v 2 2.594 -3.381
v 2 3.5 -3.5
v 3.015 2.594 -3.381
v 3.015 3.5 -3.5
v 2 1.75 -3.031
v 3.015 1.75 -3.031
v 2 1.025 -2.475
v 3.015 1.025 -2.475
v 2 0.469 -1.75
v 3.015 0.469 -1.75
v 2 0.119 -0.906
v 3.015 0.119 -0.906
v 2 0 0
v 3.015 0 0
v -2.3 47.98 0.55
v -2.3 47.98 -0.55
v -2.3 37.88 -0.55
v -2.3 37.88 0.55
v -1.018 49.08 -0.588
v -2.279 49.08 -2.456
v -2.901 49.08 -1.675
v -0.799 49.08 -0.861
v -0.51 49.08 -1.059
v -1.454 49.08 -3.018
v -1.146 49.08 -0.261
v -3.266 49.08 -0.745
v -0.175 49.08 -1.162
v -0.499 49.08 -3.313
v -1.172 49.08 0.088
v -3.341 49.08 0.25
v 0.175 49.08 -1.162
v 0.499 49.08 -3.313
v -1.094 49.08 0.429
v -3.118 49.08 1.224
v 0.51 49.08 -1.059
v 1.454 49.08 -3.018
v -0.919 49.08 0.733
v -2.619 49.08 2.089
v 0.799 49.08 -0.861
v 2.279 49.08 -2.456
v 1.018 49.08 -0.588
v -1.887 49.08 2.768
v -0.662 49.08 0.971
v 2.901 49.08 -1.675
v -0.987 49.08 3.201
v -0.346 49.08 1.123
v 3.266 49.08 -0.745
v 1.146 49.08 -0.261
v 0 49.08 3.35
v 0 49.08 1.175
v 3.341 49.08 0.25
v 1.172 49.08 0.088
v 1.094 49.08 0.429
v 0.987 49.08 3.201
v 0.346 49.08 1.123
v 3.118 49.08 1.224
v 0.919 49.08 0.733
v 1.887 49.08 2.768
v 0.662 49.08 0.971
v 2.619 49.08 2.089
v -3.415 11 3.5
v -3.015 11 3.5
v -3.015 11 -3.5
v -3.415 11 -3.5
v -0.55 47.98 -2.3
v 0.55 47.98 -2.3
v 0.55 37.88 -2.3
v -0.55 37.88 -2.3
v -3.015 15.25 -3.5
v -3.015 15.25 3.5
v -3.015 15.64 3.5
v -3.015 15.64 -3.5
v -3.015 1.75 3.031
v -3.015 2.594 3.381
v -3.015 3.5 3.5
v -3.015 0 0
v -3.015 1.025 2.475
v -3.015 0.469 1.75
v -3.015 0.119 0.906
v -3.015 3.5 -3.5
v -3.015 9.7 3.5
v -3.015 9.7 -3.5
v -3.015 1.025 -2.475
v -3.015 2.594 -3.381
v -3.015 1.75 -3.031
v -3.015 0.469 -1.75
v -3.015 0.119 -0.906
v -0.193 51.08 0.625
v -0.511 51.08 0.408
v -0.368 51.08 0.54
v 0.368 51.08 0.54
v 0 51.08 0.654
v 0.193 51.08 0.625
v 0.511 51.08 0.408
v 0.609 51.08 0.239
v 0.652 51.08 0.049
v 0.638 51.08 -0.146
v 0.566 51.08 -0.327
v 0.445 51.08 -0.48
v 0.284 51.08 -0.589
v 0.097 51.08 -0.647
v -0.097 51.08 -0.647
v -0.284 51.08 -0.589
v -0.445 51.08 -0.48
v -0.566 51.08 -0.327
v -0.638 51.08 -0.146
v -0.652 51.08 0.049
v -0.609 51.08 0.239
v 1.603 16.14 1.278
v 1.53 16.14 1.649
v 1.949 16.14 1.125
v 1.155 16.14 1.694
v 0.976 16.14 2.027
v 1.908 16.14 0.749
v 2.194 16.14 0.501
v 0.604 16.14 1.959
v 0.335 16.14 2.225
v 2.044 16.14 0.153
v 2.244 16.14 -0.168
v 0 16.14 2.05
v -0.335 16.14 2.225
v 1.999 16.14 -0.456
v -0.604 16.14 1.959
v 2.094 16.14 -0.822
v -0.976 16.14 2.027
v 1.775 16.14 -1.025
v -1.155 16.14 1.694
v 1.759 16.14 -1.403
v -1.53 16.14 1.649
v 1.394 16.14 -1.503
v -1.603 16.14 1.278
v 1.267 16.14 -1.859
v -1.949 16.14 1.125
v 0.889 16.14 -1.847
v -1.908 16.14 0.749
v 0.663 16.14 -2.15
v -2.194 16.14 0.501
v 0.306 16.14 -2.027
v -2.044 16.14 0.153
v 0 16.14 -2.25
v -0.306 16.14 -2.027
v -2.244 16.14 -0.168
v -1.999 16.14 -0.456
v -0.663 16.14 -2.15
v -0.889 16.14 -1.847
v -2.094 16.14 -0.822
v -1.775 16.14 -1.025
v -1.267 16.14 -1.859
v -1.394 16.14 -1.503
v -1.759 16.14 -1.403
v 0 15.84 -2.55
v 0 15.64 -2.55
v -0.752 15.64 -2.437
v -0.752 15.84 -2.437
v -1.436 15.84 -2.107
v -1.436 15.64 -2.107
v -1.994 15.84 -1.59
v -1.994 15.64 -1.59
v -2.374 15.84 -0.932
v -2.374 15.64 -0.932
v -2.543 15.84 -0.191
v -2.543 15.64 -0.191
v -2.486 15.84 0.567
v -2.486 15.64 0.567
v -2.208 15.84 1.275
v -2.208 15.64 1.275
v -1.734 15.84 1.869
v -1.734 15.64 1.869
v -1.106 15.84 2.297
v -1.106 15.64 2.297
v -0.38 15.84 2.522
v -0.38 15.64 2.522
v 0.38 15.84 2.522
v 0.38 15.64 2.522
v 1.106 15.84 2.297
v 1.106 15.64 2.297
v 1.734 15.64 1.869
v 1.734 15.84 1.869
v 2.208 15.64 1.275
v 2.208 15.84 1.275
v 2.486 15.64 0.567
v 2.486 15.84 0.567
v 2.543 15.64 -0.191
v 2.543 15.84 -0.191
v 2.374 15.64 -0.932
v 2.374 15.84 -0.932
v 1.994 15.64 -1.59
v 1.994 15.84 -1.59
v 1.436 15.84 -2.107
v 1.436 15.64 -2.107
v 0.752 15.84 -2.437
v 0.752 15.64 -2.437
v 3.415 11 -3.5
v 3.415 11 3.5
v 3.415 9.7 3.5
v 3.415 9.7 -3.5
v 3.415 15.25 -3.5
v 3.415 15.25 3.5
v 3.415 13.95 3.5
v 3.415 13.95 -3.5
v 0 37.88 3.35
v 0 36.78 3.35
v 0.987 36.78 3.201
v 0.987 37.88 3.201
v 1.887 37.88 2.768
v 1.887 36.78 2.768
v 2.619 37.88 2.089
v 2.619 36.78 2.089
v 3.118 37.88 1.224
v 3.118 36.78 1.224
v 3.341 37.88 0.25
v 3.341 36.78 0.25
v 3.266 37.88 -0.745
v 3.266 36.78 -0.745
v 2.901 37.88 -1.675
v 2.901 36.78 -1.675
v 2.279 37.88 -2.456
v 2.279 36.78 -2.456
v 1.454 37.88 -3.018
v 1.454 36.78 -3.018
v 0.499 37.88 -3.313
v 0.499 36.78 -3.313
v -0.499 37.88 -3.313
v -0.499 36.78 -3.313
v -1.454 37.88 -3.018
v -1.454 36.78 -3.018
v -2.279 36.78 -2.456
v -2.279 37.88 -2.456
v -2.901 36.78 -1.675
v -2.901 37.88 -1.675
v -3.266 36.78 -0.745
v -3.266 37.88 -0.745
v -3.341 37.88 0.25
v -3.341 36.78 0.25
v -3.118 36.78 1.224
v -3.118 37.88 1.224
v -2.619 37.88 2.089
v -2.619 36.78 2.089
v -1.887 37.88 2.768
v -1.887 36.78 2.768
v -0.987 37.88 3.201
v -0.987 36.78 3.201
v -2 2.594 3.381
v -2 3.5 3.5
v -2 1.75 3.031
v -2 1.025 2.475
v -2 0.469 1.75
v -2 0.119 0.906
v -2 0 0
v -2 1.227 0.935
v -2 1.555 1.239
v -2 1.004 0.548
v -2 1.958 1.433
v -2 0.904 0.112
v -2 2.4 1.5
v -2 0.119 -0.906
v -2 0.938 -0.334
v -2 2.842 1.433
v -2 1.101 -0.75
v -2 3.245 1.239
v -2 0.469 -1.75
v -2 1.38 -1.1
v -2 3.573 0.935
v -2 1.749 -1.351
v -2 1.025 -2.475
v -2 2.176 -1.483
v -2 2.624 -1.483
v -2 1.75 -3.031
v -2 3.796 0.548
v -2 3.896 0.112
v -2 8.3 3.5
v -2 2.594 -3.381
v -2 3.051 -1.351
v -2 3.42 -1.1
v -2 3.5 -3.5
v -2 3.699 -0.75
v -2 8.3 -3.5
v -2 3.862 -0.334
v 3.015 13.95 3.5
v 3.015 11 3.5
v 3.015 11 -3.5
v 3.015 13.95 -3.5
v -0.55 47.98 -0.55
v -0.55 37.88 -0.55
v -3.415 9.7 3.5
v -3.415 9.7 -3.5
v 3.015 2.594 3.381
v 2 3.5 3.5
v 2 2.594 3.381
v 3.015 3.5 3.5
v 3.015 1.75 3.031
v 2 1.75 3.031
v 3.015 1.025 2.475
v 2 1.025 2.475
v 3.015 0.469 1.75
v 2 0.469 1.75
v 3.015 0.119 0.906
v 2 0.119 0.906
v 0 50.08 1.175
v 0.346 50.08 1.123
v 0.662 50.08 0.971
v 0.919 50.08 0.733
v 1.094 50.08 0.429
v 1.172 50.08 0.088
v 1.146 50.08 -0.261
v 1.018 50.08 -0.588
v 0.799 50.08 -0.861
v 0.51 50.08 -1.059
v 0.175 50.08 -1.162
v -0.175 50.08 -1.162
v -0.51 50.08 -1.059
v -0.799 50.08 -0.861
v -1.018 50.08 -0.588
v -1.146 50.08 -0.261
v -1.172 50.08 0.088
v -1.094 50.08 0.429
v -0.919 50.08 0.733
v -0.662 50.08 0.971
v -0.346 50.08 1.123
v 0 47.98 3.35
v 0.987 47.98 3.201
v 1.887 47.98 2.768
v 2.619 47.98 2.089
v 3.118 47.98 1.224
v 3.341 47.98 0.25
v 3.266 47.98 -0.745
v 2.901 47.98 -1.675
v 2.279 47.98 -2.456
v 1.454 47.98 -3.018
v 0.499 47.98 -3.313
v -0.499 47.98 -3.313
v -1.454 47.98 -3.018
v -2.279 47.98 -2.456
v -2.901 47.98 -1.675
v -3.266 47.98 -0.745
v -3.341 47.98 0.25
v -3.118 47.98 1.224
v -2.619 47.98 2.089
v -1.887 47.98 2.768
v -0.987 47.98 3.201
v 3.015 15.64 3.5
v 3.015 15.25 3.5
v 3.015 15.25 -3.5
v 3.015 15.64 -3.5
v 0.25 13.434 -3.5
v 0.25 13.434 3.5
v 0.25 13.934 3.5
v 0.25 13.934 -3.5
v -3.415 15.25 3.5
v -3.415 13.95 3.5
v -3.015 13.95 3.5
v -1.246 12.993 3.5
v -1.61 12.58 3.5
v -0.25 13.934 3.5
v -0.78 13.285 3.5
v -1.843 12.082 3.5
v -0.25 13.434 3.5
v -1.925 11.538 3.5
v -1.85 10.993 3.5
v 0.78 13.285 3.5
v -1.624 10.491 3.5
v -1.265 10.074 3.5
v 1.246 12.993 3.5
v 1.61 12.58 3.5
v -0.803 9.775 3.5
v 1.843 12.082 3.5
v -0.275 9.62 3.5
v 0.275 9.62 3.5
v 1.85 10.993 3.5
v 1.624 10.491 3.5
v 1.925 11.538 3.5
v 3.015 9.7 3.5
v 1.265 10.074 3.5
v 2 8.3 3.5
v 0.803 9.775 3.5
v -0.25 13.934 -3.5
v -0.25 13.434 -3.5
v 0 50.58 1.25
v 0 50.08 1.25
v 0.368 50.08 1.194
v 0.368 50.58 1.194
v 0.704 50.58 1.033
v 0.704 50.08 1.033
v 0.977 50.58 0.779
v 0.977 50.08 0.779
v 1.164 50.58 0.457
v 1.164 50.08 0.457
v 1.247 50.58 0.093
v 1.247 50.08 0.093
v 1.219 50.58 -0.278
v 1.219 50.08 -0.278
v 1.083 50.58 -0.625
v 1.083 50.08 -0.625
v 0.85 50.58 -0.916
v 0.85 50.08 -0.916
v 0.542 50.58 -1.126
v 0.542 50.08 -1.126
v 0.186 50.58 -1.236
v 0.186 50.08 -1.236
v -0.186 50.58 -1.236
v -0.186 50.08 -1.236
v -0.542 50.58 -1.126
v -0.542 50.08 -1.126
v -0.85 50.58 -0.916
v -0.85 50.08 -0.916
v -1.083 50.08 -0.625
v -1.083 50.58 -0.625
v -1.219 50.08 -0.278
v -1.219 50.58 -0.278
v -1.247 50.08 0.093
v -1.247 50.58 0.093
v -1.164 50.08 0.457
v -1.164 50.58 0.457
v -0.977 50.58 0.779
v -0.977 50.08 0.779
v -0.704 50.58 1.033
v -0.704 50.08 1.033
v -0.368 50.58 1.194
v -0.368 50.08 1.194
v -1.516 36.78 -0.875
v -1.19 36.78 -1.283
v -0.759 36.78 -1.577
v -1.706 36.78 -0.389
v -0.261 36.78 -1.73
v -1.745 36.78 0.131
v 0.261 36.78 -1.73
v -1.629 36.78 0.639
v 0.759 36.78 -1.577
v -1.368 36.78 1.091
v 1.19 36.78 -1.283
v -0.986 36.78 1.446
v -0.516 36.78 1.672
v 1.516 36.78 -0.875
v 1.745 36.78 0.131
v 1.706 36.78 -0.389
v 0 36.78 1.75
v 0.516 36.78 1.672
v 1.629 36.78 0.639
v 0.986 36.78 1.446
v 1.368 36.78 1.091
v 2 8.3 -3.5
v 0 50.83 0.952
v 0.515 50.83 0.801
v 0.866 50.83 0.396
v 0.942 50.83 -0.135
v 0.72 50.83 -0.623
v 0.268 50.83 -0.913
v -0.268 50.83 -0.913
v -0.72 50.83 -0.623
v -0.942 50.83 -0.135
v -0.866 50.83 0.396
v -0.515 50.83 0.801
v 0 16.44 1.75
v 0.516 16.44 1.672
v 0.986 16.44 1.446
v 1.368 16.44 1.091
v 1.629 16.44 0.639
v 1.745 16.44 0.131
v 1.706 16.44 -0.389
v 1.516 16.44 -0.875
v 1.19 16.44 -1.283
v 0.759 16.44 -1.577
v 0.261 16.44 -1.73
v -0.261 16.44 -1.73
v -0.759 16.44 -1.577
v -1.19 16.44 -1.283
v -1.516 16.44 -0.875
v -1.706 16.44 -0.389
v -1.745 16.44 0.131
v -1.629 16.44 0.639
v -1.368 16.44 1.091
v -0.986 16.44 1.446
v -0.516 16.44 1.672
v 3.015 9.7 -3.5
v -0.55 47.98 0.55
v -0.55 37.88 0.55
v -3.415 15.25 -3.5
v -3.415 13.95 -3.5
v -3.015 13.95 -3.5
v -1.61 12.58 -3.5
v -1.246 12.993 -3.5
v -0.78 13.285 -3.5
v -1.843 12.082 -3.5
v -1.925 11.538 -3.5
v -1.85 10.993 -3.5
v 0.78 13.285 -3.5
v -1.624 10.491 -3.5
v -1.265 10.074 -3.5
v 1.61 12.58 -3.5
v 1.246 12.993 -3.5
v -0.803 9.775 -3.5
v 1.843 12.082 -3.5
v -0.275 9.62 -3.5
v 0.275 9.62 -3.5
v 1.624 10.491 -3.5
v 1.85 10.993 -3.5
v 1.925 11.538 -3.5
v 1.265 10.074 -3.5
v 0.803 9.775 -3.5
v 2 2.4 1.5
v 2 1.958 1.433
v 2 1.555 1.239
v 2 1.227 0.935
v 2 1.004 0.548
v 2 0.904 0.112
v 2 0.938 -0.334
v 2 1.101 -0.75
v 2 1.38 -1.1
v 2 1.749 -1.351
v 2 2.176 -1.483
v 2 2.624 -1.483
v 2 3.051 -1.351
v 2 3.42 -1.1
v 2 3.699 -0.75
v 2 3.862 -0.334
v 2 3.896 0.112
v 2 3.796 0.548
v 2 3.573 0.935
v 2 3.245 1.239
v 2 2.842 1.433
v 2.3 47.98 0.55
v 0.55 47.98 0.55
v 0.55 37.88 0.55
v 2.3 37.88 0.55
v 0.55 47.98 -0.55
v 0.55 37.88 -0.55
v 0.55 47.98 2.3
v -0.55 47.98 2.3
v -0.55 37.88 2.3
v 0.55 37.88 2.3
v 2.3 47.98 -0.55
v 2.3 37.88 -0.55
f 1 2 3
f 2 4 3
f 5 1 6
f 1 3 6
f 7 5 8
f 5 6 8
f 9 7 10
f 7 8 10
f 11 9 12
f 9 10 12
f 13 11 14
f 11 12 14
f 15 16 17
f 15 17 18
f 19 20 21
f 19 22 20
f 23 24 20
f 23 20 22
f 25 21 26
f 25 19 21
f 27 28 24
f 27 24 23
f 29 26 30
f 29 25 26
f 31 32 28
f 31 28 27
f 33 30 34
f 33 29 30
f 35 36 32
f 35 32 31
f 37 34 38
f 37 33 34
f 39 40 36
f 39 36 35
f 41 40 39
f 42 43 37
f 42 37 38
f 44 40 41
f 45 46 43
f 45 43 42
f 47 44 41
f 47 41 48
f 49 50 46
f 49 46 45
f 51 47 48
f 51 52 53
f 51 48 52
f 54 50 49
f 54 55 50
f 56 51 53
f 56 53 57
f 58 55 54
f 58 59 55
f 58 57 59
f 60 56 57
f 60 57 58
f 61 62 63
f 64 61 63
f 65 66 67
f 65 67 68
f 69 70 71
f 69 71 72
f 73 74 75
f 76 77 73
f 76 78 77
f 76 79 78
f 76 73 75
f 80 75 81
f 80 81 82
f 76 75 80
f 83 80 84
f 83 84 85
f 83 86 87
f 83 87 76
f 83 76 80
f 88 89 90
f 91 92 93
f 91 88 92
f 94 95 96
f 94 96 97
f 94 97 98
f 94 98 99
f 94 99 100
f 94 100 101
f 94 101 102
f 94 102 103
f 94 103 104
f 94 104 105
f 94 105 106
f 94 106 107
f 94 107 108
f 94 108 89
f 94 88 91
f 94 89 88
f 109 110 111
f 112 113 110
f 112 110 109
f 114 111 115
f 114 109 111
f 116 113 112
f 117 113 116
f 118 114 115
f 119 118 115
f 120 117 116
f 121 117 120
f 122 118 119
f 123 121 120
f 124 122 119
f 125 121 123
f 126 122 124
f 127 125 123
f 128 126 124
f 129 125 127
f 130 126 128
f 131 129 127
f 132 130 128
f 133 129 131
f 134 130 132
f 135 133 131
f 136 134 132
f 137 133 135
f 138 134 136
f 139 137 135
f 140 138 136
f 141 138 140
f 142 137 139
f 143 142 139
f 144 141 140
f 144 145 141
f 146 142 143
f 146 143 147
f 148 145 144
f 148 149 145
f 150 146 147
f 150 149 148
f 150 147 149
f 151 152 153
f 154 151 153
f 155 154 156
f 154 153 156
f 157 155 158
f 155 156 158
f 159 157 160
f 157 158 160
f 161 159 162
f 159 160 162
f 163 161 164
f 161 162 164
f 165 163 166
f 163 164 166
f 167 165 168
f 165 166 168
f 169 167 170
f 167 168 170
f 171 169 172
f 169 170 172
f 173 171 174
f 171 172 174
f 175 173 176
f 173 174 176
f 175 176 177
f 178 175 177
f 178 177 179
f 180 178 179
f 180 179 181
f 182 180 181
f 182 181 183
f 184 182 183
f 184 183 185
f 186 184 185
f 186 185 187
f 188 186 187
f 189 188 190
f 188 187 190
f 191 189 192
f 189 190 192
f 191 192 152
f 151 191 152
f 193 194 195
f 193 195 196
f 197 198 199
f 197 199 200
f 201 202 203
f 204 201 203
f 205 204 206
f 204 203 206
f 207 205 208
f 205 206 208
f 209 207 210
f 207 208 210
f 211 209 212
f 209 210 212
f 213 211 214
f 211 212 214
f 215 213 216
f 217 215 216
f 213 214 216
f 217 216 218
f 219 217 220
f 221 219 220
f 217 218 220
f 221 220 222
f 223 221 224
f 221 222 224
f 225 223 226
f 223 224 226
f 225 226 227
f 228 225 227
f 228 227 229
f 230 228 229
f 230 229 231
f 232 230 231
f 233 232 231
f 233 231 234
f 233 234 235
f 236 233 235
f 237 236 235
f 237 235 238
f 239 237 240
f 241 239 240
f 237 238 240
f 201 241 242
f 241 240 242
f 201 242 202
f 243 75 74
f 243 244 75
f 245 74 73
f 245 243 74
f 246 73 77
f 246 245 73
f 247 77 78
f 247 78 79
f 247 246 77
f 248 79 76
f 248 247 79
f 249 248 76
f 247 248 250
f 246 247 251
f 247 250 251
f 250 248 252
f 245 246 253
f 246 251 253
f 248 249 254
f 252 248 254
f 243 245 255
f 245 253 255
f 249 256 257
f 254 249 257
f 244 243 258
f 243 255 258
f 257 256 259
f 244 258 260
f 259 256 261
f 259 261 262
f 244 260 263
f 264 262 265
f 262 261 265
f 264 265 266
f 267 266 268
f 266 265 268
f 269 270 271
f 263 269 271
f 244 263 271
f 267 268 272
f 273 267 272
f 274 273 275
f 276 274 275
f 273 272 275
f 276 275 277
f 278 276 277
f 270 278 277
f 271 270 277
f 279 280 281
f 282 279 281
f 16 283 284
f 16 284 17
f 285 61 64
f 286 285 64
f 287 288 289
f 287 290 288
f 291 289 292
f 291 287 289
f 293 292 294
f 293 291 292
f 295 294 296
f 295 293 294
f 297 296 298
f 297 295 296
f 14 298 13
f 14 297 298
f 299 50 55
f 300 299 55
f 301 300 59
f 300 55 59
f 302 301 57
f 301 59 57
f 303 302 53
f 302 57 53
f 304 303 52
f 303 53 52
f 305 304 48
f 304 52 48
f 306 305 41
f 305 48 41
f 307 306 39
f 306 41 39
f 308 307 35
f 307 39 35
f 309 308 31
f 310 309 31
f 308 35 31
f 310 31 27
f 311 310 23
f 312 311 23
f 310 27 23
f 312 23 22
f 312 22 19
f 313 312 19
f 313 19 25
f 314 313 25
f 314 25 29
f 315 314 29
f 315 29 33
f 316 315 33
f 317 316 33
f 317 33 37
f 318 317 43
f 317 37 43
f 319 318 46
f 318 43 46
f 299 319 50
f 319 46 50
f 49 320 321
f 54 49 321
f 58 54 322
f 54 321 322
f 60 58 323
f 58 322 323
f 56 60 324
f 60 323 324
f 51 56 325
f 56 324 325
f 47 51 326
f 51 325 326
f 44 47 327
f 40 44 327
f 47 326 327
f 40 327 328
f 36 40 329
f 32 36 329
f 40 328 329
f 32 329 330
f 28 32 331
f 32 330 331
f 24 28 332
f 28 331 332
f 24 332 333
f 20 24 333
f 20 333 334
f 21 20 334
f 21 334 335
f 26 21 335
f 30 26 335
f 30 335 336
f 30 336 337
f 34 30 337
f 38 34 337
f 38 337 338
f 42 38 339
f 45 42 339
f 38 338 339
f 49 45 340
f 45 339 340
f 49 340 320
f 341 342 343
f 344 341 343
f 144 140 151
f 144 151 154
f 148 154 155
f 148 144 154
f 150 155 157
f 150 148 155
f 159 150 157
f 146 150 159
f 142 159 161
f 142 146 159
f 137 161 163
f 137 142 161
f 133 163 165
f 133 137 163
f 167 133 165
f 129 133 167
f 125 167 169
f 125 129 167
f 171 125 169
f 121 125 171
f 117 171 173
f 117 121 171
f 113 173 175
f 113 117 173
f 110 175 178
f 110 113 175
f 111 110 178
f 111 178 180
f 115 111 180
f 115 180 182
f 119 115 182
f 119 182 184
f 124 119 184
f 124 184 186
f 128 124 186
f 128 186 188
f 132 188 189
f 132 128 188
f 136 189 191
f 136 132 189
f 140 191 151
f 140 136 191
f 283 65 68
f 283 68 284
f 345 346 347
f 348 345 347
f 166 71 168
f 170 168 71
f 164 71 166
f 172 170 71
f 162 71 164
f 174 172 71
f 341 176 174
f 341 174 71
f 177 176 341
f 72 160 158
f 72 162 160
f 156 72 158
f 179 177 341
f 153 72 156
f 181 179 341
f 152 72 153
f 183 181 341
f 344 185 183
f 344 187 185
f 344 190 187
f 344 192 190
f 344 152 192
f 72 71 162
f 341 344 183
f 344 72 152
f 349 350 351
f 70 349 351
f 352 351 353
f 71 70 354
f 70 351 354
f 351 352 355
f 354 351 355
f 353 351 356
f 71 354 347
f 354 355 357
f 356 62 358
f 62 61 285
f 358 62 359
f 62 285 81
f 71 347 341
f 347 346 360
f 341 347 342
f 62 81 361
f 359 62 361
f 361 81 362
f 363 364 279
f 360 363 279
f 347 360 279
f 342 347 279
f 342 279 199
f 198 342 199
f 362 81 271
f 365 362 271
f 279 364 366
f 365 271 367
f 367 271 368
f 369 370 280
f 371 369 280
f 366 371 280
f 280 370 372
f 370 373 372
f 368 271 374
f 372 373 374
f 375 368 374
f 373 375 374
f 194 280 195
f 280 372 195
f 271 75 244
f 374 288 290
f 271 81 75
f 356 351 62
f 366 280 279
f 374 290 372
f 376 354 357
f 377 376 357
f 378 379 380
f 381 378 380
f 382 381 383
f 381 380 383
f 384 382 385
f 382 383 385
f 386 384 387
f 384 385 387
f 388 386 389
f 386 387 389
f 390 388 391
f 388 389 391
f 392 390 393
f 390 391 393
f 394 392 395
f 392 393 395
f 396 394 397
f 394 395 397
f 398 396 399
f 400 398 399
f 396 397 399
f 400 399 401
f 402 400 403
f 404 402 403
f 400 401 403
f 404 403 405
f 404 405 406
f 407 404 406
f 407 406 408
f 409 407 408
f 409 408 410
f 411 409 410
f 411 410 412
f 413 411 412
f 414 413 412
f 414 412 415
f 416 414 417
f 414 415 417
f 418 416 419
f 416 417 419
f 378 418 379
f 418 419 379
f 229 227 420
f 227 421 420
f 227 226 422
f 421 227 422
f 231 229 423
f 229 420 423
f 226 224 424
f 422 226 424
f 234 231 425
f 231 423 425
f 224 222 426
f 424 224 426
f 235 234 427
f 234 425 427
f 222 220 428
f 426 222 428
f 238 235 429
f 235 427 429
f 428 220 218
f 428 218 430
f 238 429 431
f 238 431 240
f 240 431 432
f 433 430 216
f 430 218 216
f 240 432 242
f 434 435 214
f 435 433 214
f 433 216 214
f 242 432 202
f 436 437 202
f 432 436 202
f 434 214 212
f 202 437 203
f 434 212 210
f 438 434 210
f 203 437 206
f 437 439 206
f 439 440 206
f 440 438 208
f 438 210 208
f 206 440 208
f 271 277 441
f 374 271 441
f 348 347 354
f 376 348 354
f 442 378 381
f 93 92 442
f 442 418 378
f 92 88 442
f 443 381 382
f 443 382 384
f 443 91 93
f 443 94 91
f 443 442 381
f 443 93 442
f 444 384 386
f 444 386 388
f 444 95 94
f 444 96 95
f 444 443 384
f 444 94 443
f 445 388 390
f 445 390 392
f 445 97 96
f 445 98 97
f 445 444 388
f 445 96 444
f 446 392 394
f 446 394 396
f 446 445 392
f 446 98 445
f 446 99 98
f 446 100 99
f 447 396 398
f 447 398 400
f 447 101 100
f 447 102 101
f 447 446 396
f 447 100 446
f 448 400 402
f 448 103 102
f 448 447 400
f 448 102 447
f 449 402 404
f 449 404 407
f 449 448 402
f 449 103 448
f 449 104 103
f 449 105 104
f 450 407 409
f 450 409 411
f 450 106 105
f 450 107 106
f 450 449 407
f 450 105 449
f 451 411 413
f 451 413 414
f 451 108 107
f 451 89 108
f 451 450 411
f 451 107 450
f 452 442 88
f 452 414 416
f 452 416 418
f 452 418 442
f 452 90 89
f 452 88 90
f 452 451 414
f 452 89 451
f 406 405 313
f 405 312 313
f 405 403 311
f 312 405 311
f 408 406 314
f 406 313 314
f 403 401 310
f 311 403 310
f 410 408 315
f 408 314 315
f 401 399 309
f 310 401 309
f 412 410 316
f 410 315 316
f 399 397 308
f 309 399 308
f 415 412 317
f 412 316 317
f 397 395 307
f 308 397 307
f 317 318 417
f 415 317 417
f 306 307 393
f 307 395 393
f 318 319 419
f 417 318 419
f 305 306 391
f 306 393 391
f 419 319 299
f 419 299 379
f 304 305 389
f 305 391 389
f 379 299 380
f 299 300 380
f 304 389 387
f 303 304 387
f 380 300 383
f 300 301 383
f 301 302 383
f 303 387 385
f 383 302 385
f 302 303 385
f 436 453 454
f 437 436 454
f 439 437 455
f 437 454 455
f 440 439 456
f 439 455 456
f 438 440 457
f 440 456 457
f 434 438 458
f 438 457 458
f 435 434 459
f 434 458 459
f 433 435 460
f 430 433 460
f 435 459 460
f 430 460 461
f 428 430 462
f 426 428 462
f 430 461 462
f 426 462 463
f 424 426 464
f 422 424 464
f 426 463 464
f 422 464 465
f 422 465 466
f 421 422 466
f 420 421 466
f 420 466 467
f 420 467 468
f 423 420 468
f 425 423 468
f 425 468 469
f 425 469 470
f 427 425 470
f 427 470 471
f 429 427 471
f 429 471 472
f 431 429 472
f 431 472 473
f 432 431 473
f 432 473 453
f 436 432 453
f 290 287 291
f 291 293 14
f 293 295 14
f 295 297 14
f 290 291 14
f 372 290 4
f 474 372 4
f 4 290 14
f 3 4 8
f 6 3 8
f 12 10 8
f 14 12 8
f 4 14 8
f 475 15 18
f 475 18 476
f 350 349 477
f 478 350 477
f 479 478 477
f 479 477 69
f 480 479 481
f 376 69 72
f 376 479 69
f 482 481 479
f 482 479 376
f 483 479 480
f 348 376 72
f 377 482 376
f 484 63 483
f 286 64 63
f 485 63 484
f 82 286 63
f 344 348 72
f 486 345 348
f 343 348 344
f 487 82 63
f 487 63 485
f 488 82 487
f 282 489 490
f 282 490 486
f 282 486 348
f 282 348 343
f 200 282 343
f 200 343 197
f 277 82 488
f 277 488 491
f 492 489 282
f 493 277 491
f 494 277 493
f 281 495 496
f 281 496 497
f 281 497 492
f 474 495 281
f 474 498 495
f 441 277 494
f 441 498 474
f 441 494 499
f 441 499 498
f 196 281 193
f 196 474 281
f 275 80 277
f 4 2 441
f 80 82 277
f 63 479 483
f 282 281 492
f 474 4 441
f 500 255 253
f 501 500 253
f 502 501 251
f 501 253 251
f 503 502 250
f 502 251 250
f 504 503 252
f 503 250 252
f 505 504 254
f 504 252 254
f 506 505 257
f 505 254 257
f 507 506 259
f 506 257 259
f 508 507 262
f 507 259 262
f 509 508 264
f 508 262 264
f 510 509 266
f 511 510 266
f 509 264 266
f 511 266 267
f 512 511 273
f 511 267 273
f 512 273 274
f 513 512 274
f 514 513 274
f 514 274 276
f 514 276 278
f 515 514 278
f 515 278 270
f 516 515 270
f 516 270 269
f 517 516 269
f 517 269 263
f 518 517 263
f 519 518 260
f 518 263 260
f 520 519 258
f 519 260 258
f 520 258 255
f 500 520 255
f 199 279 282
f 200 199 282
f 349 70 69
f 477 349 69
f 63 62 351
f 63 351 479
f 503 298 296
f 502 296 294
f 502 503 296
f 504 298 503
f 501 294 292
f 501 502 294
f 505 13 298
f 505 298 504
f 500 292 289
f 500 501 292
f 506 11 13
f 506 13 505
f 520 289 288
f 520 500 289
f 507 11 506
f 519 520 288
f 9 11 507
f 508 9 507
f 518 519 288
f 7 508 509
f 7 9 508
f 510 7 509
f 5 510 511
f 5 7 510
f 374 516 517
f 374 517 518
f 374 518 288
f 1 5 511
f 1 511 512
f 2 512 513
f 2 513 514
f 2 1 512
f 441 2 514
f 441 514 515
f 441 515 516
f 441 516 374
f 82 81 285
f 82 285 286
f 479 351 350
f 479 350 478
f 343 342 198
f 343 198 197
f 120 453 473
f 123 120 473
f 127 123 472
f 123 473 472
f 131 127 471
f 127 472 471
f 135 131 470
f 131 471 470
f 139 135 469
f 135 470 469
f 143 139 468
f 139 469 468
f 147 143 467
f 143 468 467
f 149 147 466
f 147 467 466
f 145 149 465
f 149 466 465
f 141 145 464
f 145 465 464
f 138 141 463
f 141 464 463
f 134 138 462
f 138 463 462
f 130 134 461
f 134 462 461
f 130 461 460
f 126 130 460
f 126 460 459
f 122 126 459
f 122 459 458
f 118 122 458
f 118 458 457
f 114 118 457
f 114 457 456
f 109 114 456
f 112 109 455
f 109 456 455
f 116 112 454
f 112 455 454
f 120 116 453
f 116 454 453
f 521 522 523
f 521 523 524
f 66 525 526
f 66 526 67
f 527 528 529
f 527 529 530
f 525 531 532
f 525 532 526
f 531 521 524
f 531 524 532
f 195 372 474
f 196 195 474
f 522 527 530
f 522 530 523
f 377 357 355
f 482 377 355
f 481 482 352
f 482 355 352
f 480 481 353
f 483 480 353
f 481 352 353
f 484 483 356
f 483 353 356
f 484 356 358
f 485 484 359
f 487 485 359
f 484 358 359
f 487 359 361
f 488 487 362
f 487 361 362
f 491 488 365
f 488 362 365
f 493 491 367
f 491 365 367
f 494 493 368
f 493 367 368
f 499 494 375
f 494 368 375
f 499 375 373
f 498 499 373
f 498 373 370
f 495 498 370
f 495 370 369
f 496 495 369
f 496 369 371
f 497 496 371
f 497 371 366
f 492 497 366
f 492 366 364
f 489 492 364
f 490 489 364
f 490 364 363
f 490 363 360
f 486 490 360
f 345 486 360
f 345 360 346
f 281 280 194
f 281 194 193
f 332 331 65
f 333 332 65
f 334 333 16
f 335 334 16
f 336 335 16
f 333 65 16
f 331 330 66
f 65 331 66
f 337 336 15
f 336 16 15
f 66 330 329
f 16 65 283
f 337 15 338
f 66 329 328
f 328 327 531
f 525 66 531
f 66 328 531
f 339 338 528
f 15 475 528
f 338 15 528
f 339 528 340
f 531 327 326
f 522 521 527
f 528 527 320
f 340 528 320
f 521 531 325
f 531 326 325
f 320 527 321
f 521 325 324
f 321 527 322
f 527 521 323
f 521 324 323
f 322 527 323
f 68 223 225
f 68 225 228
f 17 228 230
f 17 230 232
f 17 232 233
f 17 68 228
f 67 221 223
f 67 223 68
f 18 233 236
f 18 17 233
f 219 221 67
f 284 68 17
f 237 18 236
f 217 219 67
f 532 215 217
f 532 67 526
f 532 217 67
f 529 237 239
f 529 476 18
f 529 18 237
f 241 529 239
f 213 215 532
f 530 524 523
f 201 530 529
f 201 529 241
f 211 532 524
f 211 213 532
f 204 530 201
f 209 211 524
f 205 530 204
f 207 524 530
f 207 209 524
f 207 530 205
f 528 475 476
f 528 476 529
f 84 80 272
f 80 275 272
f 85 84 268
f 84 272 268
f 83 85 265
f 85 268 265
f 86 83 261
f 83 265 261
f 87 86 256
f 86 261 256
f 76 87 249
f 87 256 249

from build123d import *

# Parameters (mm, degrees)
SKETCH2_W               = 6.03
SKETCH2_H               = 7
BOSS_EXTRUDE1_DEPTH     = 15.64
CUT_EXTRUDE1_DEPTH      = 17.307968144
CUT_EXTRUDE1_DEPTH_BACK = 17.307968144
SKETCH3_W               = 4
SKETCH3_H               = 8.3
FILLET1_R               = 3.5
SKETCH4_R               = 1.5
BOSS_EXTRUDE2_DEPTH     = 4
CUT_EXTRUDE2_DEPTH      = 18.398270747
CUT_EXTRUDE2_DEPTH_BACK = 18.398270747
SKETCH7_W               = 7
SKETCH7_H               = 1.3
BOSS_EXTRUDE3_DEPTH     = 0.4
SKETCH8_R               = 1.75
BOSS_EXTRUDE4_DEPTH     = 21.14
SKETCH9_R               = 3.35
BOSS_EXTRUDE5_DEPTH     = 1.1
BOSS_EXTRUDE6_DEPTH     = 10.1
SKETCH11_R              = 3.35
BOSS_EXTRUDE7_DEPTH     = 1.1
SKETCH12_R              = 1.175
BOSS_EXTRUDE8_DEPTH     = 1
SKETCH13_R              = 1.25
BOSS_EXTRUDE9_DEPTH     = 1
CHAMFER1_SIZE           = 0.5
CHAMFER1_SIZE2          = 0.595876796
SKETCH14_R              = 2.55
BOSS_EXTRUDE10_DEPTH    = 0.5
CHAMFER3_SIZE           = 0.3


with BuildPart() as part:
    # Sketch2 → Boss-Extrude1 (new body)
    with BuildSketch(Plane(origin=(0, 0, 0), x_dir=(1, 0, 0), z_dir=(0, 1, 0))):
        Rectangle(SKETCH2_W, SKETCH2_H)
    extrude(amount=BOSS_EXTRUDE1_DEPTH)

    # Sketch3 → Cut-Extrude1 (cut, two sides: drawn at the far end of the back side and taken through both)
    with BuildSketch(Plane.XY.offset(-CUT_EXTRUDE1_DEPTH_BACK)):
        with Locations((0, 4.15)):
            Rectangle(SKETCH3_W, SKETCH3_H)
    extrude(amount=CUT_EXTRUDE1_DEPTH + CUT_EXTRUDE1_DEPTH_BACK, mode=Mode.SUBTRACT)

    # Fillet1
    fillet1_edges = [part.edges().sort_by_distance(p)[0] for p in [
        (-2.5075, 0, 3.5),
        (-2.5075, 0, -3.5),
        (2.5075, 0, -3.5),
        (2.5075, 0, 3.5),
    ]]
    fillet(fillet1_edges, radius=FILLET1_R - 0.0001)  # a hair under: the kernel refuses the full size

    # Sketch4 → Boss-Extrude2 (add)
    with BuildSketch(Plane(origin=(-2, 0, 0), x_dir=(0, 0, -1), z_dir=(1, 0, 0))):
        with Locations(Location((0, 2.4, 0), (0, 0, 180))):
            Circle(SKETCH4_R)
    extrude(amount=BOSS_EXTRUDE2_DEPTH)

    # Sketch6 → Cut-Extrude2 (cut, two sides: drawn at the far end of the back side and taken through both)
    with BuildSketch(Plane(origin=(0, 0, -3.5), x_dir=(-1, 0, 0), z_dir=(0, 0, -1)).offset(-CUT_EXTRUDE2_DEPTH_BACK)):
        with BuildLine():
            Line((-0.25, 13.4336972), (-0.25, 13.9336972))
            Line((-0.25, 13.9336972), (0.25, 13.9336972))
            Line((0.25, 13.9336972), (0.25, 13.4336972))
            ThreePointArc((0.25, 13.4336972), (0, 9.6), (-0.25, 13.4336972))
        make_face()
    extrude(amount=CUT_EXTRUDE2_DEPTH + CUT_EXTRUDE2_DEPTH_BACK, mode=Mode.SUBTRACT)

    # Sketch7 → Boss-Extrude3 (add)
    with BuildSketch(Plane(origin=(3.015, 0, 0), x_dir=(0, 0, -1), z_dir=(1, 0, 0))):
        with Locations((0, 14.6)):
            Rectangle(SKETCH7_W, SKETCH7_H)
        with Locations((0, 10.35)):
            Rectangle(SKETCH7_W, SKETCH7_H)
    boss_extrude3 = extrude(amount=BOSS_EXTRUDE3_DEPTH)

    # Mirror1: Boss-Extrude3 across plane
    add(boss_extrude3.mirror(Plane(origin=(0, 0, 0), x_dir=(0, 0, 1), z_dir=(1, 0, 0))))

    # Sketch8 → Boss-Extrude4 (add)
    with BuildSketch(Plane(origin=(0, 15.64, 0), x_dir=(1, 0, 0), z_dir=(0, 1, 0))):
        with Locations(Location((0, 0, 0), (0, 0, 270))):
            Circle(SKETCH8_R)
    extrude(amount=BOSS_EXTRUDE4_DEPTH)

    # Sketch9 → Boss-Extrude5 (add)
    with BuildSketch(Plane(origin=(0, 36.78, 0), x_dir=(1, 0, 0), z_dir=(0, 1, 0))):
        with Locations(Location((0, 0, 0), (0, 0, 270))):
            Circle(SKETCH9_R)
    extrude(amount=BOSS_EXTRUDE5_DEPTH)

    # Sketch10 → Boss-Extrude6 (add)
    with BuildSketch(Plane(origin=(0, 37.88, 0), x_dir=(1, 0, 0), z_dir=(0, 1, 0))):
        Polygon((-0.55, 2.3), (-0.55, 0.55), (-2.3, 0.55), (-2.3, -0.55), (-0.55, -0.55), (-0.55, -2.3), (0.55, -2.3), (0.55, -0.55), (2.3, -0.55), (2.3, 0.55), (0.55, 0.55), (0.55, 2.3), align=None)
    extrude(amount=BOSS_EXTRUDE6_DEPTH)

    # Sketch11 → Boss-Extrude7 (add)
    with BuildSketch(Plane(origin=(0, 47.98, 0), x_dir=(1, 0, 0), z_dir=(0, 1, 0))):
        with Locations(Location((0, 0, 0), (0, 0, 270))):
            Circle(SKETCH11_R)
    extrude(amount=BOSS_EXTRUDE7_DEPTH)

    # Sketch12 → Boss-Extrude8 (add)
    with BuildSketch(Plane(origin=(0, 49.08, 0), x_dir=(1, 0, 0), z_dir=(0, 1, 0))):
        with Locations(Location((0, 0, 0), (0, 0, 270))):
            Circle(SKETCH12_R)
    extrude(amount=BOSS_EXTRUDE8_DEPTH)

    # Sketch13 → Boss-Extrude9 (add)
    with BuildSketch(Plane(origin=(0, 50.08, 0), x_dir=(1, 0, 0), z_dir=(0, 1, 0))):
        with Locations(Location((0, 0, 0), (0, 0, 270))):
            Circle(SKETCH13_R)
    extrude(amount=BOSS_EXTRUDE9_DEPTH)

    # Chamfer1
    chamfer1_edges = [part.edges().sort_by_distance(p)[0] for p in [
        (0, 51.08, -1.25),
    ]]
    chamfer1_side = [part.faces().sort_by_distance(p)[0] for p in [
        (0, 50.58, -1.25),
    ]]
    chamfer(chamfer1_edges, length=CHAMFER1_SIZE, length2=CHAMFER1_SIZE2, reference=chamfer1_side[0])

    # Sketch14 → Boss-Extrude10 (add)
    with BuildSketch(Plane(origin=(0, 15.64, 0), x_dir=(1, 0, 0), z_dir=(0, 1, 0))):
        with Locations(Location((0, 0, 0), (0, 0, 90))):
            Circle(SKETCH14_R)
    extrude(amount=BOSS_EXTRUDE10_DEPTH)

    # Chamfer3
    chamfer3_edges = [part.edges().sort_by_distance(p)[0] for p in [
        (0, 16.14, -1.75),
        (0, 16.14, 2.55),
    ]]
    chamfer(chamfer3_edges, length=CHAMFER3_SIZE)


solid = part.part
